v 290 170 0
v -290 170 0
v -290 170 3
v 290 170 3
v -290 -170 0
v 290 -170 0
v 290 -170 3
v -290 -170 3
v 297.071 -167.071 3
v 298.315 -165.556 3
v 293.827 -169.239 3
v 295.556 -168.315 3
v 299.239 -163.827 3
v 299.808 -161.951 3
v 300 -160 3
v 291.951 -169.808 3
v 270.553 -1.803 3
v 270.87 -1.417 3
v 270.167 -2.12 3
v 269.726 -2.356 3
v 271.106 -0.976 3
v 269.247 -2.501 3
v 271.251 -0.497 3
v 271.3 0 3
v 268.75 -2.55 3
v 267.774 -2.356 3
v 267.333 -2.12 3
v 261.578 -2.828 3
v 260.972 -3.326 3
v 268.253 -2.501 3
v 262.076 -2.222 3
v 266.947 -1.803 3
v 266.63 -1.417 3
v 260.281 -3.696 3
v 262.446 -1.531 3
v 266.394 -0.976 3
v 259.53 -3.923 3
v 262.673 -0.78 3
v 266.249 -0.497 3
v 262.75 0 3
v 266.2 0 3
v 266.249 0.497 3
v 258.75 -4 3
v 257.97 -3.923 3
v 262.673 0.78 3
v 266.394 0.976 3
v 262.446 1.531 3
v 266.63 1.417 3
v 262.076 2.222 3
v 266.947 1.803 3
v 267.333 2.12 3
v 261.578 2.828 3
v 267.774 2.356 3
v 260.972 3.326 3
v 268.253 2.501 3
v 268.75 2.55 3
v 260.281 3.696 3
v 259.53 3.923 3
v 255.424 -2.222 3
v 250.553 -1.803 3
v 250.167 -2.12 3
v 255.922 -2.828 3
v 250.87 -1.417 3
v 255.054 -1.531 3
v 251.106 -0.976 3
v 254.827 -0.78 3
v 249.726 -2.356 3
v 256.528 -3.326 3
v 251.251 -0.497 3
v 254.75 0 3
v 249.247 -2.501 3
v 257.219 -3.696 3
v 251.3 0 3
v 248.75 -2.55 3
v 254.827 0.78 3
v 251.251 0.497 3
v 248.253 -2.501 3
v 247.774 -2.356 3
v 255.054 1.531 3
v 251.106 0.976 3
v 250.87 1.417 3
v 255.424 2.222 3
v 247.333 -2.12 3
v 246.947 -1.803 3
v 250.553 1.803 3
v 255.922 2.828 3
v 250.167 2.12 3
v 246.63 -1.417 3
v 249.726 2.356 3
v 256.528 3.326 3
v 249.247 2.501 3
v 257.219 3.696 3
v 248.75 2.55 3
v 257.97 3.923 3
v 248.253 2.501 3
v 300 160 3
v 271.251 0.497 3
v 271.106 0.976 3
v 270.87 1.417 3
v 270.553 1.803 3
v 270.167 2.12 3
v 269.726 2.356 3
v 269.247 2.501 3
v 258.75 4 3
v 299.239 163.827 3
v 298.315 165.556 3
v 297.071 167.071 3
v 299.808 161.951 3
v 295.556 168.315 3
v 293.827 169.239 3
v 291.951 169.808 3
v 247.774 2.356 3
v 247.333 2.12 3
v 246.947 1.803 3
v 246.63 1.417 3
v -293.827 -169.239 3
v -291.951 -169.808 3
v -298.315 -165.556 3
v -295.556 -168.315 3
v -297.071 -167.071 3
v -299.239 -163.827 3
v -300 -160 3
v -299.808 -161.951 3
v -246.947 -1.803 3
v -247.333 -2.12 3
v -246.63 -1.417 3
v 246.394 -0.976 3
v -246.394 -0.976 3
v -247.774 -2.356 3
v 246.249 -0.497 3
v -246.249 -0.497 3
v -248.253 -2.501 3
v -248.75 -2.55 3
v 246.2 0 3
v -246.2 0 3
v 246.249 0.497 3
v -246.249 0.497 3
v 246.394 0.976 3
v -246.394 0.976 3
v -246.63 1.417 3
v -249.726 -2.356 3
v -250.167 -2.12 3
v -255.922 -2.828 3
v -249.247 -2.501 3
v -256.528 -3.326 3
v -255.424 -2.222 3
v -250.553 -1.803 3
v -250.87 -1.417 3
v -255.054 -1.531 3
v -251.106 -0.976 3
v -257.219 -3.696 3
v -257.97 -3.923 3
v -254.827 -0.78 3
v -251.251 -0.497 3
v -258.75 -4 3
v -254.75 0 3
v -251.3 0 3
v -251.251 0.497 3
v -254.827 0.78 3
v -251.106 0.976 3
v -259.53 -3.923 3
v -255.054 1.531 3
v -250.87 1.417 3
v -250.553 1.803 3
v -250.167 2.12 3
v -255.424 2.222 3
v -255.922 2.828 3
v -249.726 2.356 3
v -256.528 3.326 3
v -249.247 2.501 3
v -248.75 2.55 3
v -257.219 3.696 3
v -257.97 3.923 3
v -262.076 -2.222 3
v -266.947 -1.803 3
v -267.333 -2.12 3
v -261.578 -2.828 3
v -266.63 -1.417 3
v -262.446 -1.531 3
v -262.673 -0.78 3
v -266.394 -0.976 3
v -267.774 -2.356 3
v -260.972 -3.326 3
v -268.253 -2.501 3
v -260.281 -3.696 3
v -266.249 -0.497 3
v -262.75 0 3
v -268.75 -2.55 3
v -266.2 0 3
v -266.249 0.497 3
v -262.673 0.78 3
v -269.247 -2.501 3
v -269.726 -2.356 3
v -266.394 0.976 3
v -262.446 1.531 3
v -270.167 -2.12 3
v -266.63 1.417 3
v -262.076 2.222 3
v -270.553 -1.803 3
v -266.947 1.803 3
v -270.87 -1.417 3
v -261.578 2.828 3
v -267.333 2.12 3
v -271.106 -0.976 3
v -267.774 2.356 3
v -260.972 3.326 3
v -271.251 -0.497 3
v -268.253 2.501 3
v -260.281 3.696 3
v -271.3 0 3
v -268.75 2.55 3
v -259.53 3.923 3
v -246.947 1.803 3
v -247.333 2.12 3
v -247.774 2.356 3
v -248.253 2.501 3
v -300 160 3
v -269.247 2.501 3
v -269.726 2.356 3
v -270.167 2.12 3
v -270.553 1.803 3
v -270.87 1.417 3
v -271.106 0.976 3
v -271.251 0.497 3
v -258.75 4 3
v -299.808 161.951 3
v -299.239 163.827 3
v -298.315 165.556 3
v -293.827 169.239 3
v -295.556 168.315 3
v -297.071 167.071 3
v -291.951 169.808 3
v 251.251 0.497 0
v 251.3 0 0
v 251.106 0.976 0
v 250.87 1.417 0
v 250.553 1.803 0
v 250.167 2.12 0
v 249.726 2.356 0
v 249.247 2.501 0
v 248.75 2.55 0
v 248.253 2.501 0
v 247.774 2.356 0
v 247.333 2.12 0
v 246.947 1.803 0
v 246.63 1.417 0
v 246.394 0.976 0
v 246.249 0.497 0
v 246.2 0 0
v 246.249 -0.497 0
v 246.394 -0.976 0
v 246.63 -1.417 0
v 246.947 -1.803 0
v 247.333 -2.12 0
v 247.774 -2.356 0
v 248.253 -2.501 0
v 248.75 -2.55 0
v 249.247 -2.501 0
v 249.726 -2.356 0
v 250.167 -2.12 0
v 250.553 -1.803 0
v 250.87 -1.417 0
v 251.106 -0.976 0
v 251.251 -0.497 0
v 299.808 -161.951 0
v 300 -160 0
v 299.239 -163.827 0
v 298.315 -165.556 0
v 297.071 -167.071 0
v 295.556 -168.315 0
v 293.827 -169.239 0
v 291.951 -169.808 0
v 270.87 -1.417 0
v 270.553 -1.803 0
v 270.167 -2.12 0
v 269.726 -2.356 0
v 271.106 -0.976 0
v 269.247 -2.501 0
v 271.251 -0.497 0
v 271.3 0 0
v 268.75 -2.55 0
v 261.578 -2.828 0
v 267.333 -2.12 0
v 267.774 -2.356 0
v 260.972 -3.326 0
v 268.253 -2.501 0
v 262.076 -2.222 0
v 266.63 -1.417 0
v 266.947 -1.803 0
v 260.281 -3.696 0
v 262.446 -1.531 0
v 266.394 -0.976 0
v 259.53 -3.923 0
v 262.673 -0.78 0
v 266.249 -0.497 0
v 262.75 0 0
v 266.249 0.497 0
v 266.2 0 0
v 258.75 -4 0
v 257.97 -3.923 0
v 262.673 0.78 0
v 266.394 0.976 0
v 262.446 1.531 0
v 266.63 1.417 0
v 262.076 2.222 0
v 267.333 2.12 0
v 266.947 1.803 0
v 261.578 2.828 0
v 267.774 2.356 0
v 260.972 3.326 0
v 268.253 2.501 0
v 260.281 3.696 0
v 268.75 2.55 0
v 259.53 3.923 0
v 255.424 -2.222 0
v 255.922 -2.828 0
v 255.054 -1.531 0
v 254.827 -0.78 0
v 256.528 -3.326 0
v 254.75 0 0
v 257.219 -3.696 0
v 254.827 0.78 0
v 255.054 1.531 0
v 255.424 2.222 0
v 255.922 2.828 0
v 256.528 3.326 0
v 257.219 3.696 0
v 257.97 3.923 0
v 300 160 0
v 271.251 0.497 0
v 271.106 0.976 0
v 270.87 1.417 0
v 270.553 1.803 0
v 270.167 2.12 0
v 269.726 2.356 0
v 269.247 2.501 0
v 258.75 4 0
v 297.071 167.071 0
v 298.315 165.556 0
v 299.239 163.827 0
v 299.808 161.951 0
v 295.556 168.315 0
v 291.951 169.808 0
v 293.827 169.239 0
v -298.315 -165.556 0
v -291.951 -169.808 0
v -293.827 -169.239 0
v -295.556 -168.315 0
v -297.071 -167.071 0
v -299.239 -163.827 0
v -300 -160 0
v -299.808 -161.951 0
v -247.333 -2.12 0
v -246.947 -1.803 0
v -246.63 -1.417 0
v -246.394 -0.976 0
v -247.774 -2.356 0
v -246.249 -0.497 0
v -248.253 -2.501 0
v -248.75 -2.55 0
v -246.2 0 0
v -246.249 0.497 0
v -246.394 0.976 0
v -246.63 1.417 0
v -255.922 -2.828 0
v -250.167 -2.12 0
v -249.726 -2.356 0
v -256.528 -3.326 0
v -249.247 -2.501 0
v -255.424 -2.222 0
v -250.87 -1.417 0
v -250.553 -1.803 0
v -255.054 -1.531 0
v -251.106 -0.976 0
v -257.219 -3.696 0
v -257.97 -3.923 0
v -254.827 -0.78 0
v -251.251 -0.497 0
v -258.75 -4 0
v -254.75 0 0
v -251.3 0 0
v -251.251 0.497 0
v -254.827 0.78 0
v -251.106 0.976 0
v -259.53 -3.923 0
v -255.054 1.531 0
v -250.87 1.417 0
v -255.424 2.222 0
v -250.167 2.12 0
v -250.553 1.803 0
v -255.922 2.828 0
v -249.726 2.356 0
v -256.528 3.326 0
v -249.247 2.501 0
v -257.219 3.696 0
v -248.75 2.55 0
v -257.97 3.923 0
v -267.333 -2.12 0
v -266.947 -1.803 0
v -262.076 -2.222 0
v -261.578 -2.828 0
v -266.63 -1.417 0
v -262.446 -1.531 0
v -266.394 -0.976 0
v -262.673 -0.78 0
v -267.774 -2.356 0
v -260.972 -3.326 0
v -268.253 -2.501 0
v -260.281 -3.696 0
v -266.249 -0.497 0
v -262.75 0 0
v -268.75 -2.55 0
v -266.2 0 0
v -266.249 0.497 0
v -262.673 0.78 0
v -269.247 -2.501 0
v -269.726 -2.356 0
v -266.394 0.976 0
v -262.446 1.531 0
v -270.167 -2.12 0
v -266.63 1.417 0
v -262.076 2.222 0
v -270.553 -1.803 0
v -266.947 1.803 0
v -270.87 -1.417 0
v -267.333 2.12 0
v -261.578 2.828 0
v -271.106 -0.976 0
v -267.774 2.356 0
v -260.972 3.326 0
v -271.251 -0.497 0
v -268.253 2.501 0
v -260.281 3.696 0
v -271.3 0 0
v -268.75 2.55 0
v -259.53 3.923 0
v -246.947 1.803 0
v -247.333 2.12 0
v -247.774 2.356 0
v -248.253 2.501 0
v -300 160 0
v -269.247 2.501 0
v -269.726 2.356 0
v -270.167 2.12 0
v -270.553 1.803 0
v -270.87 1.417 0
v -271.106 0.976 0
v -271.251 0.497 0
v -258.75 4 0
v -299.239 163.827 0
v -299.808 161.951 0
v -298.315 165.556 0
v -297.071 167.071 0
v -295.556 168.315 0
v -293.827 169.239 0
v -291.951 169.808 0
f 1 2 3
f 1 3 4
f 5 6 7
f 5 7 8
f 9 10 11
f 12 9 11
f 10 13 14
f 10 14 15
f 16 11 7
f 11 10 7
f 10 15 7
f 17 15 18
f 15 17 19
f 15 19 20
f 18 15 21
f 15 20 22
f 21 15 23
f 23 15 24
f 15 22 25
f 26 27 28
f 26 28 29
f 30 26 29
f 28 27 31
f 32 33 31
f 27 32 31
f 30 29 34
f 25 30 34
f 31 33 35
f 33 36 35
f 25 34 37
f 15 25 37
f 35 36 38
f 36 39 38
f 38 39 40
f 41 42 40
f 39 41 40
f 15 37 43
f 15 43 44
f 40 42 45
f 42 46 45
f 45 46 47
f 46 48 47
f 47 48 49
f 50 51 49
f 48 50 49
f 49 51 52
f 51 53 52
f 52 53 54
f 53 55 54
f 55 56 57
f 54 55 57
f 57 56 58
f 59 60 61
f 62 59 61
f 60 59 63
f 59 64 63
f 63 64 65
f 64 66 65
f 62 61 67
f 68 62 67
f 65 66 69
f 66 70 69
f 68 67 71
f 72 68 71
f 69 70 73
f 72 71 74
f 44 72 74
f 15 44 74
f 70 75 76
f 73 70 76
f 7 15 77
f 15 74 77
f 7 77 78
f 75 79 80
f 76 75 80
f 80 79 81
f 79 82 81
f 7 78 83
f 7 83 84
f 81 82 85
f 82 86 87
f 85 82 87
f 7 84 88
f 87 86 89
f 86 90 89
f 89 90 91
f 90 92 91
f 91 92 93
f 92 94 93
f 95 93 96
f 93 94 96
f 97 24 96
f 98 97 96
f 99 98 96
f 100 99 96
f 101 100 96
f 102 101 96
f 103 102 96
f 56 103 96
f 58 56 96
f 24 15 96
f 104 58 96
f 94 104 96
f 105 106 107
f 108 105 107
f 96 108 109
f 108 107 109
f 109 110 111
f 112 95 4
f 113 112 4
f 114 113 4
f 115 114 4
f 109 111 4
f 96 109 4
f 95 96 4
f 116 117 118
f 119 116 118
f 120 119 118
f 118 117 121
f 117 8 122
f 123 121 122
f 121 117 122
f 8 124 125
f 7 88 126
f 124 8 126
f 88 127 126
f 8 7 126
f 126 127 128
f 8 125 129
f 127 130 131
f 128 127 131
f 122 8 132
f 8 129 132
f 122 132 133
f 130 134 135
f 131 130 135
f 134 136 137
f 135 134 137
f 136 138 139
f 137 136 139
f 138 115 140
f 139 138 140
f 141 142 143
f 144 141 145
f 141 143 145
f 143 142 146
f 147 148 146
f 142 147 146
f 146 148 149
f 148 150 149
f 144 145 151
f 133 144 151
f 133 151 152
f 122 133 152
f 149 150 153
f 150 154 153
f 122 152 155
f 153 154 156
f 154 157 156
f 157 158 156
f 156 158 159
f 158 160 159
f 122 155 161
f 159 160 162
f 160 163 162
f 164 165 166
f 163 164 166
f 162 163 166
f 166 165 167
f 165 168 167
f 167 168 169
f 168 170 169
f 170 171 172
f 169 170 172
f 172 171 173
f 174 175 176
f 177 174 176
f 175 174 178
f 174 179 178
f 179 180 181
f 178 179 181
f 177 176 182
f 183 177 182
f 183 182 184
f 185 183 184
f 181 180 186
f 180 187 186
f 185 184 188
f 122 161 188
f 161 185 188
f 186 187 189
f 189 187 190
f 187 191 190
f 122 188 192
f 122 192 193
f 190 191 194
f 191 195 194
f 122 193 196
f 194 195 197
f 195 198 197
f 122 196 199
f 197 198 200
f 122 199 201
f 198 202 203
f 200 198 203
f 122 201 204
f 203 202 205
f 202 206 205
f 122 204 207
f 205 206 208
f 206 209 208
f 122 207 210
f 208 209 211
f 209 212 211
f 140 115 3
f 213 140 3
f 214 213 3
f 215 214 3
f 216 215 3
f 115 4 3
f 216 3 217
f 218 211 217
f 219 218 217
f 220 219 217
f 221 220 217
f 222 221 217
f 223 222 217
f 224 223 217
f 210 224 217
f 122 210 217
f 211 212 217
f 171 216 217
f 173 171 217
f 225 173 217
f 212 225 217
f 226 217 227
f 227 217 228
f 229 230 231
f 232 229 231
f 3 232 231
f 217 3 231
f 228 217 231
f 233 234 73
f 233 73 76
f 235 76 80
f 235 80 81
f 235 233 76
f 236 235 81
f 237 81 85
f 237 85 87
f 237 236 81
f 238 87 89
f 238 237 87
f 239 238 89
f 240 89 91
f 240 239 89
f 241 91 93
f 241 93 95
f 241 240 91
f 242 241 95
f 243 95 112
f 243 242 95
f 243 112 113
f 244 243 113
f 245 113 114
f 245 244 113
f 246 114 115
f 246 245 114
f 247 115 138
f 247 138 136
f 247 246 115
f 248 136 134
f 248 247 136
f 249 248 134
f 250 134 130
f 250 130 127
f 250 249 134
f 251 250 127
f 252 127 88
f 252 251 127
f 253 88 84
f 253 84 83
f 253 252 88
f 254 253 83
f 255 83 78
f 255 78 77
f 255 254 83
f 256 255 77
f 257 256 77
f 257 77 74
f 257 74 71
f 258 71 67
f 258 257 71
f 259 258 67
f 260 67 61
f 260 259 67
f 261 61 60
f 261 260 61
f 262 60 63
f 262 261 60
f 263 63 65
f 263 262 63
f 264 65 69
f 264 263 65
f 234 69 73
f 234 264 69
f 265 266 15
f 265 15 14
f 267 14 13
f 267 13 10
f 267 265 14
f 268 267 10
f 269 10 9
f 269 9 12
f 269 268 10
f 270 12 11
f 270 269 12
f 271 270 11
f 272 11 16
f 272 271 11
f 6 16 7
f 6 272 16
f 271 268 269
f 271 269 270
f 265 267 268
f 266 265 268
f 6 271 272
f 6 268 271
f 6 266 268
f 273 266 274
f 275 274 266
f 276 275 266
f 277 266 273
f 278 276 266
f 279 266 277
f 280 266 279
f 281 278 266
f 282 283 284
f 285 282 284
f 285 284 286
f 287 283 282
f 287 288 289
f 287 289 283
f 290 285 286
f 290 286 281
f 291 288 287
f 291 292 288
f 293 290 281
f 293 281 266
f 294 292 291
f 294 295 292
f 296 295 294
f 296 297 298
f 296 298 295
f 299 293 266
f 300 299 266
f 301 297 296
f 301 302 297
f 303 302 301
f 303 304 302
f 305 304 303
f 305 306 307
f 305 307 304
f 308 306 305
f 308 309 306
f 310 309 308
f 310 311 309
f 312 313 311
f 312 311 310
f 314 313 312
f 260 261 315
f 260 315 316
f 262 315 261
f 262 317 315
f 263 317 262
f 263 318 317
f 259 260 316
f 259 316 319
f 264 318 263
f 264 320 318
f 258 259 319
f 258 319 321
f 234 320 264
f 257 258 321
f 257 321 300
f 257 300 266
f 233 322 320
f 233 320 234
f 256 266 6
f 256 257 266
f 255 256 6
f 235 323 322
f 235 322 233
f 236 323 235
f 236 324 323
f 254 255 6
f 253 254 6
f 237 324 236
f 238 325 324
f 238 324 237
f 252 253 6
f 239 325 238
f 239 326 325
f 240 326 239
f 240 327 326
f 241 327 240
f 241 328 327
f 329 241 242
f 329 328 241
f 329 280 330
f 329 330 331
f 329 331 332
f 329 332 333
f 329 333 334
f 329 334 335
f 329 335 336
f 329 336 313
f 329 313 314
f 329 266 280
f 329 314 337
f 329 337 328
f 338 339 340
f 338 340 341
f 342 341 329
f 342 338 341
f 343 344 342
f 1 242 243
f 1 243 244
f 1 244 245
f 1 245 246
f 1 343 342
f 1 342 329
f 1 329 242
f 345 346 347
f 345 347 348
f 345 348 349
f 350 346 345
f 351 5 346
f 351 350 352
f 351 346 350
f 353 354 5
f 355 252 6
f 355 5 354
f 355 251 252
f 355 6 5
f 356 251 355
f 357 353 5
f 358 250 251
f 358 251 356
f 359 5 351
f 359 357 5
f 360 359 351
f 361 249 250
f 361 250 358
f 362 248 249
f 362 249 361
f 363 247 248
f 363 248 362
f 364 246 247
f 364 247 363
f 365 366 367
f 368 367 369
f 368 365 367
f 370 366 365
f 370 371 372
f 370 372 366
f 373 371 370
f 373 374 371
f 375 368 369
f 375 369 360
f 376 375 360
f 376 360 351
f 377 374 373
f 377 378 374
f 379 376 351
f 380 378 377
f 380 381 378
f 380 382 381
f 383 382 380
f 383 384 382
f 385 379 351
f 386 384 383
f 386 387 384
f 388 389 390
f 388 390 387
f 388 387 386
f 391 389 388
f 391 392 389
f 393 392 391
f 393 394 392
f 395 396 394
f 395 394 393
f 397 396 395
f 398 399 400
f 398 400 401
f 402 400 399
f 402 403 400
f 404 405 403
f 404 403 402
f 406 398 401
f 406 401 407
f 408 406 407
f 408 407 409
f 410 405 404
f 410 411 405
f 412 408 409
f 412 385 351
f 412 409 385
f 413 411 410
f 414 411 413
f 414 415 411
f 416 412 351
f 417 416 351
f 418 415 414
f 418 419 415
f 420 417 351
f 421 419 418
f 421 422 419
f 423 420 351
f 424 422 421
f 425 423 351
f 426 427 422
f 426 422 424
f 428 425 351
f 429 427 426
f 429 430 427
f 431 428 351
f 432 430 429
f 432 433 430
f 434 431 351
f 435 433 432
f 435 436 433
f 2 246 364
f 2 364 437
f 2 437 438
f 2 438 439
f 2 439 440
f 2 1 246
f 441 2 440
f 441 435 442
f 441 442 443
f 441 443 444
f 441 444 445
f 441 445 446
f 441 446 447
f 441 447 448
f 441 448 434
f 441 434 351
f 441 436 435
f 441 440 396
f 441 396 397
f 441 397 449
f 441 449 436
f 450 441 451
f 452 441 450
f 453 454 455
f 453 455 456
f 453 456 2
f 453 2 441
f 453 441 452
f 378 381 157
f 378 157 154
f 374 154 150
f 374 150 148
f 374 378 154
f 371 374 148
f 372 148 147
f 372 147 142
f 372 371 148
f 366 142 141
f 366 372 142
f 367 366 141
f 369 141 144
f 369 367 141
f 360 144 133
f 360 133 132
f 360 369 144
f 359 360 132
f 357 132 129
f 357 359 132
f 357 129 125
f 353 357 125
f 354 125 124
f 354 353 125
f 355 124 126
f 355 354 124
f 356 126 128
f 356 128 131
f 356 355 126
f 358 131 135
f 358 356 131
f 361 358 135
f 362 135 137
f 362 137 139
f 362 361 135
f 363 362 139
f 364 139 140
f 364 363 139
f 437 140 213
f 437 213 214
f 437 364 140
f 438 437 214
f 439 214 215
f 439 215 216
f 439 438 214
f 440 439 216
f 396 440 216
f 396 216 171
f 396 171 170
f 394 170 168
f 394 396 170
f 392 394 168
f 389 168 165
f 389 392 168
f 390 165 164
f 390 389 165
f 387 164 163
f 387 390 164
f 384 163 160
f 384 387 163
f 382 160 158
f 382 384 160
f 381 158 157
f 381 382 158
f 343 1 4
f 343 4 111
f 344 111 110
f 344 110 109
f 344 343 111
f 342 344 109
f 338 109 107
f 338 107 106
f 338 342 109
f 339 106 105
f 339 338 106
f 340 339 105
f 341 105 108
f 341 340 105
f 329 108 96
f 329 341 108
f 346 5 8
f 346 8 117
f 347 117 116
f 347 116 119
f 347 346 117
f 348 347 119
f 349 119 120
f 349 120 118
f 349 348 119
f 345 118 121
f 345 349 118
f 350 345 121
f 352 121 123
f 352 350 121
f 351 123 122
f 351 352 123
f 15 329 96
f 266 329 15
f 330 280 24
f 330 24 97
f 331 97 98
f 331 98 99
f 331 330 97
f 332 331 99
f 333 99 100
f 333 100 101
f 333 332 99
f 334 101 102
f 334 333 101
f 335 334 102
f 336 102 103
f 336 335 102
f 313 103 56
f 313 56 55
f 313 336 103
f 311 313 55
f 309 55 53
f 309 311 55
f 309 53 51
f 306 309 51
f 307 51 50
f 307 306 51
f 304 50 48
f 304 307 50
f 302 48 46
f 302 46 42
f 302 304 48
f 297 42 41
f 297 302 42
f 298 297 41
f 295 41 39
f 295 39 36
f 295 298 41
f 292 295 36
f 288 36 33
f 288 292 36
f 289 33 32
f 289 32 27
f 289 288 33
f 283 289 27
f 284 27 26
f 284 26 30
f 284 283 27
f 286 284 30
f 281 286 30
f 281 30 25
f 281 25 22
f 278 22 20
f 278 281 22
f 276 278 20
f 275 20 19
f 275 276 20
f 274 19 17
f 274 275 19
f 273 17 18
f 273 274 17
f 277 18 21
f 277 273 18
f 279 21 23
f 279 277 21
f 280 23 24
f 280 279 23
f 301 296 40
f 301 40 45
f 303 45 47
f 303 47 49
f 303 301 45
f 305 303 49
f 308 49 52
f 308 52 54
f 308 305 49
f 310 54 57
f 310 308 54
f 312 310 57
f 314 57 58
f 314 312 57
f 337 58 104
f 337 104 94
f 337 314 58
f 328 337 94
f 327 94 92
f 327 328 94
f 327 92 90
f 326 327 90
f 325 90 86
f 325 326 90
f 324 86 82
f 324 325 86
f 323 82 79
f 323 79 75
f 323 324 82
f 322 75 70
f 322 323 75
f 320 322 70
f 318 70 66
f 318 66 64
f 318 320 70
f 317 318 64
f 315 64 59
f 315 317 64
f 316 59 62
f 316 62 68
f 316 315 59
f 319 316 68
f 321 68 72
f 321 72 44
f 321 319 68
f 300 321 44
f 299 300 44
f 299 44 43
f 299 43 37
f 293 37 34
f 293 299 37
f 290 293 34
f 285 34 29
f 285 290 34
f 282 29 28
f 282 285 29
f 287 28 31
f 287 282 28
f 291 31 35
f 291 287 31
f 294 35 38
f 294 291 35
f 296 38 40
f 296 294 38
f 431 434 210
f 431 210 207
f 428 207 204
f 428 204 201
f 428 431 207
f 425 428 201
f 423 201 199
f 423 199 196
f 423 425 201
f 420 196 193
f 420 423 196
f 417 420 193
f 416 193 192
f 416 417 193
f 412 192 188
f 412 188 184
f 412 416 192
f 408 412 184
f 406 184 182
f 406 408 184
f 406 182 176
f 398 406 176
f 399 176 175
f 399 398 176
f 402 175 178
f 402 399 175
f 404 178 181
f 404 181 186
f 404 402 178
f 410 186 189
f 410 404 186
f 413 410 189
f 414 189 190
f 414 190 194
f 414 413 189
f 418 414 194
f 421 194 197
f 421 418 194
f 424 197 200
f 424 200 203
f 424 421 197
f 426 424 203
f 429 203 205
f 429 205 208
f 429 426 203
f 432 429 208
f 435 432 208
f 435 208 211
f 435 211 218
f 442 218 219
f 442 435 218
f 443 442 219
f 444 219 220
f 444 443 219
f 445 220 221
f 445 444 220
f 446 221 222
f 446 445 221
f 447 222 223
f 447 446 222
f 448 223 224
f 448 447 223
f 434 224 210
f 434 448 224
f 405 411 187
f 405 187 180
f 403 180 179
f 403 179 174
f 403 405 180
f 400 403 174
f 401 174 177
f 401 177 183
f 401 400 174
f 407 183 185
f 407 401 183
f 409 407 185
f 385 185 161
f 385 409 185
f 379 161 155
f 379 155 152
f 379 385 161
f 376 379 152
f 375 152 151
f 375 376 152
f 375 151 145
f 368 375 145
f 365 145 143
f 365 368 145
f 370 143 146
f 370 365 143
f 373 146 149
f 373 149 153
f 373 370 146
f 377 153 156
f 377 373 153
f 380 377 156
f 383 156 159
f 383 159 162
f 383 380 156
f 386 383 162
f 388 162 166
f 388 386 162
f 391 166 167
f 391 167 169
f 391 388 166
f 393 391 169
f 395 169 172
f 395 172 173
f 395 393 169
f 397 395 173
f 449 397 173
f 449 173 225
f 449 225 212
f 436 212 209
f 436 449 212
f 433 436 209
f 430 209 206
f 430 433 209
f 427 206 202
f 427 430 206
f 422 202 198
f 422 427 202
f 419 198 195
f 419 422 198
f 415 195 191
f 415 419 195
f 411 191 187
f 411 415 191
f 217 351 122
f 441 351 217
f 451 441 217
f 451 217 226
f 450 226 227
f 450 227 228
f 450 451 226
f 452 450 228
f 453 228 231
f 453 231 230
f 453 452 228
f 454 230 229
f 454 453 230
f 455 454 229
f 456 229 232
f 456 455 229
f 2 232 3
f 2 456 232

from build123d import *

# Parameters (mm, degrees)
CROQUIS1_R              = 4
CROQUIS1_R_2            = 2.55
SALIENTE_EXTRUIR1_DEPTH = 3


with BuildPart() as part:
    # Croquis1 → Saliente-Extruir1 (new body)
    with BuildSketch(Plane.XY):
        with BuildLine():
            Line((-290, 170), (290, 170))
            ThreePointArc((290, 170), (297.071067812, 167.071067812), (300, 160))
            Line((300, 160), (300, -160))
            ThreePointArc((300, -160), (297.071067812, -167.071067812), (290, -170))
            Line((290, -170), (-290, -170))
            ThreePointArc((-290, -170), (-297.071067812, -167.071067812), (-300, -160))
            Line((-300, -160), (-300, 160))
            ThreePointArc((-300, 160), (-297.071067812, 167.071067812), (-290, 170))
        make_face()
        with Locations((258.75, 0)):
            Circle(CROQUIS1_R, mode=Mode.SUBTRACT)
        with Locations((248.75, 0)):
            Circle(CROQUIS1_R_2, mode=Mode.SUBTRACT)
        with Locations((268.75, 0)):
            Circle(CROQUIS1_R_2, mode=Mode.SUBTRACT)
        with Locations(Location((-268.75, 0, 0), (0, 0, 180))):
            Circle(CROQUIS1_R_2, mode=Mode.SUBTRACT)
        with Locations(Location((-248.75, 0, 0), (0, 0, 180))):
            Circle(CROQUIS1_R_2, mode=Mode.SUBTRACT)
        with Locations(Location((-258.75, 0, 0), (0, 0, 180))):
            Circle(CROQUIS1_R, mode=Mode.SUBTRACT)
    extrude(amount=SALIENTE_EXTRUIR1_DEPTH)


solid = part.part
